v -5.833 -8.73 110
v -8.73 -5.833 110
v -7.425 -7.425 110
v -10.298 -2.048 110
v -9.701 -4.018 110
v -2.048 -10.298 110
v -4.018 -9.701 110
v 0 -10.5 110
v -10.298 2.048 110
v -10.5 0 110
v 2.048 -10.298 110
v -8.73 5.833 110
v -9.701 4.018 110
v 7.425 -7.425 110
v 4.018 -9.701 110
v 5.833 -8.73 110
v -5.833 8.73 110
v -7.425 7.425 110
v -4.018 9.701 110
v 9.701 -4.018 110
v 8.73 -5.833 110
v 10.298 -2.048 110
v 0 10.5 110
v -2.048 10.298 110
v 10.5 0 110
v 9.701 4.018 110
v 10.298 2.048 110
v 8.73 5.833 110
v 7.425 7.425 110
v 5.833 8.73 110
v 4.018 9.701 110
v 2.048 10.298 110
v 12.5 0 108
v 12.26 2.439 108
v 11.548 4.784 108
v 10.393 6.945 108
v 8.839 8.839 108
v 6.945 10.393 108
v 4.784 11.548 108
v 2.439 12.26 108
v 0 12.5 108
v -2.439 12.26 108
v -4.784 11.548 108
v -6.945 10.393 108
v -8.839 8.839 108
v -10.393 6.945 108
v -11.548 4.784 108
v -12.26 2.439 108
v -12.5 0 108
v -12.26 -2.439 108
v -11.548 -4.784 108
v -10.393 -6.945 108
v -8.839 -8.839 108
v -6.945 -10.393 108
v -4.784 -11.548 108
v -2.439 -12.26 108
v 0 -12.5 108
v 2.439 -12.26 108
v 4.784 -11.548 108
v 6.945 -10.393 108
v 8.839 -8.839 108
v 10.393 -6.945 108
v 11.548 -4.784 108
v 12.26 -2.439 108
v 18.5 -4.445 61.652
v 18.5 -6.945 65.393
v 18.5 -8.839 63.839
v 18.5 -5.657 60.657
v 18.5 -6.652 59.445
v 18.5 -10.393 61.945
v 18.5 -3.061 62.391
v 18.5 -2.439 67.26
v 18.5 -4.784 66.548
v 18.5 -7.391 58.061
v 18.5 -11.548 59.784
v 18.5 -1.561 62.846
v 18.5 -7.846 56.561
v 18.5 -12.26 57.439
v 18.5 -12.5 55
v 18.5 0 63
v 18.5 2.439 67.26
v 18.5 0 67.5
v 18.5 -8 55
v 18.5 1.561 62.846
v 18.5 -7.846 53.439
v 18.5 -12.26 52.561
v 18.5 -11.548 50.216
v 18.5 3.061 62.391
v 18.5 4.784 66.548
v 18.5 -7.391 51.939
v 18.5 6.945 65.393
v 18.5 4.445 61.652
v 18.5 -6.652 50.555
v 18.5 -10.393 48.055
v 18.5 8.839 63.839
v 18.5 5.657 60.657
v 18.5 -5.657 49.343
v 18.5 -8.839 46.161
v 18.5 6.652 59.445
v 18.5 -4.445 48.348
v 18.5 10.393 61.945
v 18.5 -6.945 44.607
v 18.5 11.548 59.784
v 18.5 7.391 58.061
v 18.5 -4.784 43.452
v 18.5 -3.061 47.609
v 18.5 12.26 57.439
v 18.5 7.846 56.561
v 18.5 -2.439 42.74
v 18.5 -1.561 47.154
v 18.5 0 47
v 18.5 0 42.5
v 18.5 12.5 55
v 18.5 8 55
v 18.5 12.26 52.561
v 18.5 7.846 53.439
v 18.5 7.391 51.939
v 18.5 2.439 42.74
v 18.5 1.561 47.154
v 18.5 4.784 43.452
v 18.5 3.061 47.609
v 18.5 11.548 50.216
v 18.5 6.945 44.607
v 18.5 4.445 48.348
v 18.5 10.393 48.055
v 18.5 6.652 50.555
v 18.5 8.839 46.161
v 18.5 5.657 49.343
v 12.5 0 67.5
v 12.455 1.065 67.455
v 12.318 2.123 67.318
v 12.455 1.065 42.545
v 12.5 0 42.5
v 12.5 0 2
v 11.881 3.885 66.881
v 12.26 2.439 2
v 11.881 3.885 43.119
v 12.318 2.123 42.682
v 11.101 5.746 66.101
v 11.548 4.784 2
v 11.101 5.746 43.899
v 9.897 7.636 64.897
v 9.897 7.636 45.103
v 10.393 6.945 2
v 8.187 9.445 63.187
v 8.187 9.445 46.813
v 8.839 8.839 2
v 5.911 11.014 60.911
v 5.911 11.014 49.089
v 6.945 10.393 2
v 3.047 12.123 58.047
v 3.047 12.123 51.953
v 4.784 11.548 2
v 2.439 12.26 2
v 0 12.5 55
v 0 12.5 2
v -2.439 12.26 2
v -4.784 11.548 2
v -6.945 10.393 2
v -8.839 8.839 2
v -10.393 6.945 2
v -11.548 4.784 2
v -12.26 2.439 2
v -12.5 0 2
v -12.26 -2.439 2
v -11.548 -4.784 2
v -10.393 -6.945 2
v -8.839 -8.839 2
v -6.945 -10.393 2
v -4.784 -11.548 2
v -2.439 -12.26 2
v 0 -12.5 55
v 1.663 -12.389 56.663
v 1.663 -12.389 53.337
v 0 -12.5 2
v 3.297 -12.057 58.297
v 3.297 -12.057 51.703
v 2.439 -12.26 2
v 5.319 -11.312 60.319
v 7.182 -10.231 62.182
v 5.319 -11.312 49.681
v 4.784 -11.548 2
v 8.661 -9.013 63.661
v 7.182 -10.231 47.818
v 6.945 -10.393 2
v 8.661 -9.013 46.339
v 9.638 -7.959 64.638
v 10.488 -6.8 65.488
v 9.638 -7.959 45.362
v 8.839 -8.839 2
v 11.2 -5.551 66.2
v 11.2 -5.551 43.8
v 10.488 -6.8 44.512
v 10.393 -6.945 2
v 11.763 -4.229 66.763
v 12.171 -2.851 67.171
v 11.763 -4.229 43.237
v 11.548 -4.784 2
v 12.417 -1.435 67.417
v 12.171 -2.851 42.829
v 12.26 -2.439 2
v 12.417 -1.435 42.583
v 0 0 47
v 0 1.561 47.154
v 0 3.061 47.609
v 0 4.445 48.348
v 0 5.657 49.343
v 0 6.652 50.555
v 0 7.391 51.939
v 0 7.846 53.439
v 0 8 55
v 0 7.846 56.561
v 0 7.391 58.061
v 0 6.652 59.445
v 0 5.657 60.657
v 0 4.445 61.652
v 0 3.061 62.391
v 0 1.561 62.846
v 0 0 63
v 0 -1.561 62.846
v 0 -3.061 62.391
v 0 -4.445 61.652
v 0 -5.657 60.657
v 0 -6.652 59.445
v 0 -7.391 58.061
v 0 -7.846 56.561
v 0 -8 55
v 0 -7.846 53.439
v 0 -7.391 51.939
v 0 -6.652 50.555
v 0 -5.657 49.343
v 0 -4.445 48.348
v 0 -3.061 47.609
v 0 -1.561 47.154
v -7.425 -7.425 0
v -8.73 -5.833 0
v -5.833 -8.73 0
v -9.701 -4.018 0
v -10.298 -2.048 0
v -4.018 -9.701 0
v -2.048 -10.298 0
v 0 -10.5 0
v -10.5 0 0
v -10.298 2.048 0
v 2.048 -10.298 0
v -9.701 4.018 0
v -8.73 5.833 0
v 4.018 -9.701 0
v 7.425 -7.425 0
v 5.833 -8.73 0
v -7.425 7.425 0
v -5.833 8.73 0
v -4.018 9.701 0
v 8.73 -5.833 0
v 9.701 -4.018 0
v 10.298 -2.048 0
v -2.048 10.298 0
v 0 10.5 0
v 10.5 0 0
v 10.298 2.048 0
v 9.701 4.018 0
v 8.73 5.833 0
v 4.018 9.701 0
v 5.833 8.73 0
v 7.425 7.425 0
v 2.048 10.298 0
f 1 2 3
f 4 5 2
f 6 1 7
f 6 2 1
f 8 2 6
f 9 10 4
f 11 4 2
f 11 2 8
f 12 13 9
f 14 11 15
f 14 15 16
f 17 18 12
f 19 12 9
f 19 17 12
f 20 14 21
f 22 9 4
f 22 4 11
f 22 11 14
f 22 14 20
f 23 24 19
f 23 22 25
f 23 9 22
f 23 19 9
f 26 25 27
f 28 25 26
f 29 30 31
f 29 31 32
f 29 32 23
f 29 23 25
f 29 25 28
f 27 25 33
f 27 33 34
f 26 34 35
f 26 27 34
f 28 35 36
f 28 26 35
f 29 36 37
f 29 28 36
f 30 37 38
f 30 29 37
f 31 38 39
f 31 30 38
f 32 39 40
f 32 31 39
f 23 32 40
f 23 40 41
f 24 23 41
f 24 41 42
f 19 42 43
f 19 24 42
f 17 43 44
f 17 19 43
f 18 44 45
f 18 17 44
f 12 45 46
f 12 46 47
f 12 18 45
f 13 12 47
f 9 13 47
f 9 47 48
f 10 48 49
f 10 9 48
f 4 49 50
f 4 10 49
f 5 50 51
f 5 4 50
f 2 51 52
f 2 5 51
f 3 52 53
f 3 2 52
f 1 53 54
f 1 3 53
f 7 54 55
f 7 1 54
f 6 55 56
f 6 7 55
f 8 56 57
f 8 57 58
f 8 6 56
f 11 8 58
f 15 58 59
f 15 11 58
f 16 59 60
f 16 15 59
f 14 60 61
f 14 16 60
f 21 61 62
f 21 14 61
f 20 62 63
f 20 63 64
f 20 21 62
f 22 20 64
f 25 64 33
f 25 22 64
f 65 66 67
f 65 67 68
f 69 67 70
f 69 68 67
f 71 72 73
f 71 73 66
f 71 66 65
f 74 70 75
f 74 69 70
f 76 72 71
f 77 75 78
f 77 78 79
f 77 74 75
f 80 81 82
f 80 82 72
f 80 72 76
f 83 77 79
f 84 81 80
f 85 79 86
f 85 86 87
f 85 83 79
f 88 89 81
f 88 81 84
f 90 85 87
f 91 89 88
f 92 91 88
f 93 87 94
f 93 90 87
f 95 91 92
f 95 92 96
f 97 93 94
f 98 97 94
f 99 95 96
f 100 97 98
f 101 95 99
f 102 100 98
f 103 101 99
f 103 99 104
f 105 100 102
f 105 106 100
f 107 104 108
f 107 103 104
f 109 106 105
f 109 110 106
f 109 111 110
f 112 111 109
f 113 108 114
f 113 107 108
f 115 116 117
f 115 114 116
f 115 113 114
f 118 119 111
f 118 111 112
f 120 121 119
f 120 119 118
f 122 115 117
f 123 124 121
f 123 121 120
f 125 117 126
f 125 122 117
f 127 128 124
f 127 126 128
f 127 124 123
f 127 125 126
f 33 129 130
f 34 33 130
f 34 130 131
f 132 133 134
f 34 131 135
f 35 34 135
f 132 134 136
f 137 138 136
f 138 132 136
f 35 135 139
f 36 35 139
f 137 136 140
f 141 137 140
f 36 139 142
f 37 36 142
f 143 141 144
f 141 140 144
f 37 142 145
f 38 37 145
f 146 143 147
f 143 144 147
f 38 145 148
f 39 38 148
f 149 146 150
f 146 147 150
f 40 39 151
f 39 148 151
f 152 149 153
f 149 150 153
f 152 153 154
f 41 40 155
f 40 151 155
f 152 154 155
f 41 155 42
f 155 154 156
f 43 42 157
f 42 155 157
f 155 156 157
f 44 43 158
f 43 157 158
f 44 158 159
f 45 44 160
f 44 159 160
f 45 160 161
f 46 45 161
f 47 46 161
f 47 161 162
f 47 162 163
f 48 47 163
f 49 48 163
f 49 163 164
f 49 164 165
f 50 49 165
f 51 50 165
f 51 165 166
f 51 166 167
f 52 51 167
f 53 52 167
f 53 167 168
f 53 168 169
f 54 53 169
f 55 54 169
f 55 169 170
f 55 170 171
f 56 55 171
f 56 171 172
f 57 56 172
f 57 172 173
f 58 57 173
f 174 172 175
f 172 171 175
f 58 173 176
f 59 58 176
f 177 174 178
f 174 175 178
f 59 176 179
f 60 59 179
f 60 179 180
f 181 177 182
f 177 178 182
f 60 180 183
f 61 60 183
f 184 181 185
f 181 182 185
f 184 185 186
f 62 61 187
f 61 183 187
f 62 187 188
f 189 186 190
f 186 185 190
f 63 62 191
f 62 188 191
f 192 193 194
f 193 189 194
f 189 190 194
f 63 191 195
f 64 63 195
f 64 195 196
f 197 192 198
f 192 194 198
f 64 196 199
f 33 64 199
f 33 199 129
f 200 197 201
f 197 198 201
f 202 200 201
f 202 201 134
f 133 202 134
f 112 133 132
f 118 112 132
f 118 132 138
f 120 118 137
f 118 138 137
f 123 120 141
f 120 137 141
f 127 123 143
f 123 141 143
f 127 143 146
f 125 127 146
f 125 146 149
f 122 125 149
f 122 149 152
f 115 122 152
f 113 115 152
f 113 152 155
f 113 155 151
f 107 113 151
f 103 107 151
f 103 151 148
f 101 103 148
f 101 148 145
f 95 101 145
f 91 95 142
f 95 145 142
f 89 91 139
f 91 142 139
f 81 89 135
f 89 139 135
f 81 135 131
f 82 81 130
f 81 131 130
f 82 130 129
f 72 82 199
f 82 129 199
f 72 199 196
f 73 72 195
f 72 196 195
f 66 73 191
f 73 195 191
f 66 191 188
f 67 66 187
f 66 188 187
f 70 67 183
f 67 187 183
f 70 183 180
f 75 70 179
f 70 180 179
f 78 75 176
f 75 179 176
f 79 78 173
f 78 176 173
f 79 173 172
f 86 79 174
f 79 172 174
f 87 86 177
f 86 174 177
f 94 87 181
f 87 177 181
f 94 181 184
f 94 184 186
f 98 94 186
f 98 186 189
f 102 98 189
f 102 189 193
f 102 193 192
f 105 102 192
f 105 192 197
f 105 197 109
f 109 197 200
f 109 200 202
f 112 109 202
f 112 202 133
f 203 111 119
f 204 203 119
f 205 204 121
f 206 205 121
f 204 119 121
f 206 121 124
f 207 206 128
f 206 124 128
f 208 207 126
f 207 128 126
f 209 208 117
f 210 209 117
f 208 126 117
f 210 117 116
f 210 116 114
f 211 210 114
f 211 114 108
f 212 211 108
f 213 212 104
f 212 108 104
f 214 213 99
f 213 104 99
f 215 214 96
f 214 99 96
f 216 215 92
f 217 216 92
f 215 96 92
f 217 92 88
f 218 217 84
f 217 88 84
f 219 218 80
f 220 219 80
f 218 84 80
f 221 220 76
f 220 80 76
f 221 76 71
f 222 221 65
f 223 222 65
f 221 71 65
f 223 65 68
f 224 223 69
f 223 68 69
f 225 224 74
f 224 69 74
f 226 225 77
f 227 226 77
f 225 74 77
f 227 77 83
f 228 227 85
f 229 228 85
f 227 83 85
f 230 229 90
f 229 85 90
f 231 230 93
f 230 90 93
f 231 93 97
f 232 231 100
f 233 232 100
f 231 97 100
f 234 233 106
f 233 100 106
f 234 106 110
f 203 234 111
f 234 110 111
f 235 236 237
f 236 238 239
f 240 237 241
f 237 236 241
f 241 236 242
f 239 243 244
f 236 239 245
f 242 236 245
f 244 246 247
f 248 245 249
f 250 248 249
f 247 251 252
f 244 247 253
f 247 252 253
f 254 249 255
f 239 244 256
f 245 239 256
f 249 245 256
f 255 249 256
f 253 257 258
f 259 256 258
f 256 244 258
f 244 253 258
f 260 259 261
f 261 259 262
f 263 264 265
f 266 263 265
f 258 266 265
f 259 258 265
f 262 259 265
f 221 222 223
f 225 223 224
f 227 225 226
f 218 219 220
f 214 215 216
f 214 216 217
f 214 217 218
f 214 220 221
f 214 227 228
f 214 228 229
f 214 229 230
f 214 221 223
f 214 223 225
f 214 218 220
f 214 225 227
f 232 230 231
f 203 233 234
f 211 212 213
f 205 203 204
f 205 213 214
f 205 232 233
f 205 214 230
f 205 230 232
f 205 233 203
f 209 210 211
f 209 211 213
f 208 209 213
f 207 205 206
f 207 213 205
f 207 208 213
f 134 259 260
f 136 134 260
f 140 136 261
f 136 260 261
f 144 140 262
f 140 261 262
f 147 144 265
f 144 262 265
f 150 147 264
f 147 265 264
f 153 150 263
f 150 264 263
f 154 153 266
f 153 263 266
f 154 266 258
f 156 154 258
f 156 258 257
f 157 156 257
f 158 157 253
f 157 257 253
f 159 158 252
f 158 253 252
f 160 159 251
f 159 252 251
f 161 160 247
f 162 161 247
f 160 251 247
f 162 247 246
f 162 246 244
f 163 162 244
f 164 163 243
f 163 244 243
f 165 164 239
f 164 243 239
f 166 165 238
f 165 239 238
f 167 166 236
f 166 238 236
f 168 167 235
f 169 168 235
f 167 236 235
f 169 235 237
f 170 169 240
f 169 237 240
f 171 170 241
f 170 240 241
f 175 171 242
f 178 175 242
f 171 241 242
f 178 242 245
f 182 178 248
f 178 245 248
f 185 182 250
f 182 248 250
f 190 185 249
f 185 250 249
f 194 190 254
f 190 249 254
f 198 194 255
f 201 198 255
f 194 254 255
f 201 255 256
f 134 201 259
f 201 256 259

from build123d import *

# Parameters (mm, degrees)
SKETCH3_R           = 12.5
BOSS_EXTRUDE1_DEPTH = 110
SKETCH4_R           = 12.5
BOSS_EXTRUDE2_DEPTH = 18.5
CHAMFER1_SIZE       = 2
SKETCH5_R           = 8
CUT_EXTRUDE1_DEPTH  = 18.5


with BuildPart() as part:
    # Sketch3 → Boss-Extrude1 (new body)
    with BuildSketch(Plane.XY):
        Circle(SKETCH3_R)
    extrude(amount=BOSS_EXTRUDE1_DEPTH)

    # Sketch4 → Boss-Extrude2 (add)
    with BuildSketch(Plane(origin=(0, 0, 0), x_dir=(0, 0, -1), z_dir=(1, 0, 0))):
        with Locations((-55, 0)):
            Circle(SKETCH4_R)
    extrude(amount=BOSS_EXTRUDE2_DEPTH)

    # Chamfer1
    chamfer1_edges = [part.edges().sort_by_distance(p)[0] for p in [
        (-12.5, 0, 0),
        (-12.5, 0, 110),
    ]]
    chamfer(chamfer1_edges, length=CHAMFER1_SIZE)

    # Sketch5 → Cut-Extrude1 (cut)
    with BuildSketch(Plane(origin=(18.5, 0, 0), x_dir=(0, 0, -1), z_dir=(1, 0, 0))):
        with Locations((-55, 0)):
            Circle(SKETCH5_R)
    extrude(amount=-CUT_EXTRUDE1_DEPTH, mode=Mode.SUBTRACT)


solid = part.part
